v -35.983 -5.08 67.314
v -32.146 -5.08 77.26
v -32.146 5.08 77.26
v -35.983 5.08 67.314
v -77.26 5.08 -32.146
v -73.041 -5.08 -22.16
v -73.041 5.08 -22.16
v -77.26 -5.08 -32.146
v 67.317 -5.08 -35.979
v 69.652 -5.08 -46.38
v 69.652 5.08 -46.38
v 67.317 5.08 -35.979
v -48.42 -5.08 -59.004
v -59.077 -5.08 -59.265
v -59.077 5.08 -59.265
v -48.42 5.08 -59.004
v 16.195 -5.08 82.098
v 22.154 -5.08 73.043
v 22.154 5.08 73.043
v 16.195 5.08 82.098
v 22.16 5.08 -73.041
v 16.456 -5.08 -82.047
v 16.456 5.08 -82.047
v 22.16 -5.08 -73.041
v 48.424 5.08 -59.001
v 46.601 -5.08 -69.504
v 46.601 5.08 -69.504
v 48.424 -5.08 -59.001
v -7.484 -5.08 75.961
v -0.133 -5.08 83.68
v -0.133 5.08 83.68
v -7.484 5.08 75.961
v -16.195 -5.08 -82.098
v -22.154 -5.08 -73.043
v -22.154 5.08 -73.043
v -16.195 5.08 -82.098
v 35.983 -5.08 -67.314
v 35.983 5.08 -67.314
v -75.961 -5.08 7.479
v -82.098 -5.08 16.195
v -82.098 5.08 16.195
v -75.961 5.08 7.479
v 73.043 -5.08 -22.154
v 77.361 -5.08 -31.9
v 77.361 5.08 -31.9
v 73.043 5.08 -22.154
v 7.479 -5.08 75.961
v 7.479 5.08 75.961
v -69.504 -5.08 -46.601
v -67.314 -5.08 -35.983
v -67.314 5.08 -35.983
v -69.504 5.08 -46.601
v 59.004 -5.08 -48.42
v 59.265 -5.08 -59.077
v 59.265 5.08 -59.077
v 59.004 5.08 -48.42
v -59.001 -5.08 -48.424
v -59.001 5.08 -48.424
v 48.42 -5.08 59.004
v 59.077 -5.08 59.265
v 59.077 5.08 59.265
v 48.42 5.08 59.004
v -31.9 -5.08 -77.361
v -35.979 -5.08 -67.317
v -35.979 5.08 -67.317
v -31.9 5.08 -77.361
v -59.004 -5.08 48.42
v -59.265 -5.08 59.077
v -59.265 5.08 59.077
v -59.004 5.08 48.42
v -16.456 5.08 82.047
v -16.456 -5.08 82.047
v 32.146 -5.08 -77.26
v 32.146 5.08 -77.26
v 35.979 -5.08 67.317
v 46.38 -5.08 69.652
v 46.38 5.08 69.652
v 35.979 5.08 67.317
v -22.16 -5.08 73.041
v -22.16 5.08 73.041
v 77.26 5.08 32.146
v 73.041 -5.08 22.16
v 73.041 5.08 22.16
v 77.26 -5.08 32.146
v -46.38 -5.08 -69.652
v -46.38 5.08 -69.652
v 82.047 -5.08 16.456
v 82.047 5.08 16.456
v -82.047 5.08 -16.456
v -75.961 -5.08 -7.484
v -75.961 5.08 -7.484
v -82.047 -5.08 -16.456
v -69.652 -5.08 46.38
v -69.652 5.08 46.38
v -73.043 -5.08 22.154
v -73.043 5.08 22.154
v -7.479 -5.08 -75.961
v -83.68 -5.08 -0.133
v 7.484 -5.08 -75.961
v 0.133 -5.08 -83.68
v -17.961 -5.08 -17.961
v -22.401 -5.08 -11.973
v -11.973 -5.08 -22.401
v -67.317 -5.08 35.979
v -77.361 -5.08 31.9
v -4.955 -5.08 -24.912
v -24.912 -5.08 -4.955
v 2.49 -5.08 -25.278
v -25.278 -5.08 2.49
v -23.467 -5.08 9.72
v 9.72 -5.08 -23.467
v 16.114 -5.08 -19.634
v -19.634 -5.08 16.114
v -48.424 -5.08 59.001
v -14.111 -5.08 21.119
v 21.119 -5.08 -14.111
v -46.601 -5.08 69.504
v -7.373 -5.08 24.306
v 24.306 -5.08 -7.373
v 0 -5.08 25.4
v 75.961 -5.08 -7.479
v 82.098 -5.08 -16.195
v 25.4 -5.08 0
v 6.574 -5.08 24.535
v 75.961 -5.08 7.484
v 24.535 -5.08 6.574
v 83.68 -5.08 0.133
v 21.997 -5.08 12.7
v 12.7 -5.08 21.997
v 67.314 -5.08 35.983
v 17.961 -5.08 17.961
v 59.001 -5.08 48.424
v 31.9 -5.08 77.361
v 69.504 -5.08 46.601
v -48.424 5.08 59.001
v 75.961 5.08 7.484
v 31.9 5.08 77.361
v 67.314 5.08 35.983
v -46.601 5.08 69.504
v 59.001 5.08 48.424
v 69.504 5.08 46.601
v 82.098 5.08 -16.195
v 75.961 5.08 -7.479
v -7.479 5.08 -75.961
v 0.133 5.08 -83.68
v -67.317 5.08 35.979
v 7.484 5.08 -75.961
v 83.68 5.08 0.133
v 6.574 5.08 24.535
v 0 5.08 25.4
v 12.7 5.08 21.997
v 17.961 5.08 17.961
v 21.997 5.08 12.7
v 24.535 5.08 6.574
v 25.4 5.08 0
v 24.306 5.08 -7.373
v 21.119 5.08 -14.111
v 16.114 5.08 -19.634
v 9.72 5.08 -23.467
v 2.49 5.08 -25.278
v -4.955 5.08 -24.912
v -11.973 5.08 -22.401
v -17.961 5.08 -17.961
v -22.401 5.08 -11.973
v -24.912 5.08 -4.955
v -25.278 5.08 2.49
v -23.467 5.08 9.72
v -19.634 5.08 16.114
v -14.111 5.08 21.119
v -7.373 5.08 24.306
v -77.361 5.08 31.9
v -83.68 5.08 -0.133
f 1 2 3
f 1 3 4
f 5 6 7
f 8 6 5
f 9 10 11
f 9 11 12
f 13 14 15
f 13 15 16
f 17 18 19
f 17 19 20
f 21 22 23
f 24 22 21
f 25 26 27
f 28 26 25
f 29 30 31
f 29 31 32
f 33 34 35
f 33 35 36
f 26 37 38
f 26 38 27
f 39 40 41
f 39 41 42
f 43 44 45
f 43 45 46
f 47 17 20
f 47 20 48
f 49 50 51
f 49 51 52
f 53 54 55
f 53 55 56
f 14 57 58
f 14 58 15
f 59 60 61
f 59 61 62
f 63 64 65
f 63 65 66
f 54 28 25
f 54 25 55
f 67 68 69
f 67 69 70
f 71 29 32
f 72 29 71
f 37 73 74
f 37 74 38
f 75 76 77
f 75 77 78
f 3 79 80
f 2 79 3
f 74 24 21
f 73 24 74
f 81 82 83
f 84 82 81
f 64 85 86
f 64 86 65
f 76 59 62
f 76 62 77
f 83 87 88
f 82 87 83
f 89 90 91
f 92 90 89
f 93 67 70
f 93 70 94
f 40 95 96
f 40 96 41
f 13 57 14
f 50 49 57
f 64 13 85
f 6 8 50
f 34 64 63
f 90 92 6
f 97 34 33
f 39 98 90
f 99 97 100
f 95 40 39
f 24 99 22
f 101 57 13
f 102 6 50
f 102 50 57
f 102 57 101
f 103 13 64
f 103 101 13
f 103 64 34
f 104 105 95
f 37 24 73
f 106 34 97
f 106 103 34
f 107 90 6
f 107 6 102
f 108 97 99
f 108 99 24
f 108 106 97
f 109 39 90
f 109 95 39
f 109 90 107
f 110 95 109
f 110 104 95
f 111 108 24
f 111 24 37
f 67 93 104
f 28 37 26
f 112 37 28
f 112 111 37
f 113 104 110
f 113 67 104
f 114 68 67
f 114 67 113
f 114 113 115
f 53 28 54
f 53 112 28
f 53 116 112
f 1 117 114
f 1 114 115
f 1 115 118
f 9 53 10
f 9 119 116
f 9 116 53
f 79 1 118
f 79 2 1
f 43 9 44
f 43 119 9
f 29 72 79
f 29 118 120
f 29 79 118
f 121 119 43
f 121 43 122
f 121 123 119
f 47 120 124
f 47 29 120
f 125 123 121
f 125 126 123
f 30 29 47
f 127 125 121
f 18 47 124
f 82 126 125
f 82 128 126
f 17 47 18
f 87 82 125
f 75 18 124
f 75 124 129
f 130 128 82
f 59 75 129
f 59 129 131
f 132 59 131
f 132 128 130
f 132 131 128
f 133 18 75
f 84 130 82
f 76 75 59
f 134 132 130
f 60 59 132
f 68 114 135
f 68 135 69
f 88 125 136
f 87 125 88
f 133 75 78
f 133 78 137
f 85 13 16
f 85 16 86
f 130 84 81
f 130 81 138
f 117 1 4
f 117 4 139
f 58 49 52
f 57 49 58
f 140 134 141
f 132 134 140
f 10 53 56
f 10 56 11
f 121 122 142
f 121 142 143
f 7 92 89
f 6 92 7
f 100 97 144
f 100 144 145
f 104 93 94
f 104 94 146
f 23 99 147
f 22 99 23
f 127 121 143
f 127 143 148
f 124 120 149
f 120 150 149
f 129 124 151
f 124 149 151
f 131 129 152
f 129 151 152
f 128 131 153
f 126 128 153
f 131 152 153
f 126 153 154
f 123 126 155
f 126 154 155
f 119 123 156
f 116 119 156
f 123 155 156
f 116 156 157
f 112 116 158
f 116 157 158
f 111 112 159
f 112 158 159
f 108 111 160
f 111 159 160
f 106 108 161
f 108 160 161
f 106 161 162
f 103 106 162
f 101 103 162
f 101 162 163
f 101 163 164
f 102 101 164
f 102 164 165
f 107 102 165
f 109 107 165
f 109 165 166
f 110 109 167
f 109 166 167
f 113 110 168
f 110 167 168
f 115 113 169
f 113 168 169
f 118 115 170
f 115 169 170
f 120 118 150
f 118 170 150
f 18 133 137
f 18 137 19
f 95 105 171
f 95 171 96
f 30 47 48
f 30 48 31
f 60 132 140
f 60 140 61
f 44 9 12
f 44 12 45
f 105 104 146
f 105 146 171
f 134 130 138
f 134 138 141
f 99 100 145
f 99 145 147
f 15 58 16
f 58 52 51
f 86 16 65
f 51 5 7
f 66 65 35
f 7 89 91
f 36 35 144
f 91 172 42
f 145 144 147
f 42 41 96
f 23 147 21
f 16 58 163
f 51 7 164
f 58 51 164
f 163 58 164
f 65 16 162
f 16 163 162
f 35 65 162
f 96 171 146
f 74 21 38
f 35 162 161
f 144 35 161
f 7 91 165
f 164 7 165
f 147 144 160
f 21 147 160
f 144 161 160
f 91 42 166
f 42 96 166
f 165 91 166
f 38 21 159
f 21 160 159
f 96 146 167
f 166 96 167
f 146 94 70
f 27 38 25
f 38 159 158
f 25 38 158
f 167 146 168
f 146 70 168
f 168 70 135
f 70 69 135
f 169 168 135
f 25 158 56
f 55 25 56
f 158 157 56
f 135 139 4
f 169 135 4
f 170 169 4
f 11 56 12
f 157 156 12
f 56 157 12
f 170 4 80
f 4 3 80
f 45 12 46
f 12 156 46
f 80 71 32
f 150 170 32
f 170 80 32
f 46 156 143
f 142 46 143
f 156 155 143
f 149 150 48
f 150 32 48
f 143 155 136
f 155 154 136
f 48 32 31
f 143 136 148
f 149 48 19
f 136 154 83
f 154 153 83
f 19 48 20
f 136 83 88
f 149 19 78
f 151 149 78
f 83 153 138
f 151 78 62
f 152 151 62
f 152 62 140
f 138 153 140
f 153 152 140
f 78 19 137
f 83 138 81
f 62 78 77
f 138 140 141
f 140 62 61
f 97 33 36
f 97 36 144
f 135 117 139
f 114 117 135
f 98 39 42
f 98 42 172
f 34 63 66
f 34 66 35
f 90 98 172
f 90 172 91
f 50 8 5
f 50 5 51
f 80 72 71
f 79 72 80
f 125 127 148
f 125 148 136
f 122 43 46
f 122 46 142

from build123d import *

# Parameters (mm, degrees)
F1_DEPTH = 5.08
F2_DEPTH = 5.08
F3_DEPTH = 5.08


with BuildPart() as f1:
    # F0 (on Front) → F1 (new body, symmetric)
    with BuildSketch(Plane.XZ):
        with BuildLine():
            ThreePointArc((75.8478085303, 7.3177825298), (76.1119012048, 3.6631263964), (76.2, 0))
            ThreePointArc((76.2, 0), (76.1119012048, -3.6631263964), (75.8478085303, -7.3177825298))
            Line((75.8478085303, -7.3177825298), (75.9612060886, -7.4788283967))
            Line((75.9612060886, -7.4788283967), (83.6803820326, 0.1329535853))
            Line((83.6803820326, 0.1329535853), (75.9606798536, 7.4841713504))
            Line((75.9606798536, 7.4841713504), (75.8478085303, 7.3177825298))
        make_face()
        with BuildLine():
            ThreePointArc((75.8180427075, 7.62), (75.8330761724, 7.4689060931), (75.8478085303, 7.3177825298))
            Line((75.8478085303, 7.3177825298), (75.9606798536, 7.4841713504))
            Line((75.9606798536, 7.4841713504), (75.8180427075, 7.62))
        make_face()
        with BuildLine():
            Line((75.9612060886, -7.4788283967), (75.8478085303, -7.3177825298))
            ThreePointArc((75.8478085303, -7.3177825298), (75.8330761724, -7.4689060931), (75.8180427075, -7.62))
            Line((75.8180427075, -7.62), (75.9612060886, -7.4788283967))
        make_face()
        with BuildLine():
            ThreePointArc((72.9627856072, 21.9743467808), (74.7358383667, 14.8658825376), (75.8180427075, 7.62))
            Line((75.8180427075, 7.62), (75.9606798536, 7.4841713504))
            Line((75.9606798536, 7.4841713504), (82.0465489983, 16.4556315966))
            Line((82.0465489983, 16.4556315966), (73.041027291, 22.1595585897))
            Line((73.041027291, 22.1595585897), (72.9627856072, 21.9743467808))
        make_face()
        with BuildLine():
            Line((75.9612060886, -7.4788283967), (75.8180427075, -7.62))
            ThreePointArc((75.8180427075, -7.62), (74.7358383667, -14.8658825376), (72.9627856072, -21.9743467808))
            Line((72.9627856072, -21.9743467808), (73.0425857732, -22.1544209627))
            Line((73.0425857732, -22.1544209627), (82.0984249139, -16.1948337577))
            Line((82.0984249139, -16.1948337577), (75.9612060886, -7.4788283967))
        make_face()
        with BuildLine():
            ThreePointArc((72.8746320228, 22.2649502031), (72.9188535828, 22.1196924068), (72.9627856072, 21.9743467808))
            Line((72.9627856072, 21.9743467808), (73.041027291, 22.1595585897))
            Line((73.041027291, 22.1595585897), (72.8746320228, 22.2649502031))
        make_face()
        with BuildLine():
            Line((73.0425857732, -22.1544209627), (72.9627856072, -21.9743467808))
            ThreePointArc((72.9627856072, -21.9743467808), (72.9188535828, -22.1196924068), (72.8746320228, -22.2649502031))
            Line((72.8746320228, -22.2649502031), (73.0425857732, -22.1544209627))
        make_face()
        with BuildLine():
            ThreePointArc((67.2738437512, 35.7864492084), (70.3996203774, 29.1604775462), (72.8746320228, 22.2649502031))
            Line((72.8746320228, 22.2649502031), (73.041027291, 22.1595585897))
            Line((73.041027291, 22.1595585897), (77.2597130983, 32.1459289141))
            Line((77.2597130983, 32.1459289141), (67.3144490116, 35.9833664196))
            Line((67.3144490116, 35.9833664196), (67.2738437512, 35.7864492084))
        make_face()
        with BuildLine():
            Line((73.0425857732, -22.1544209627), (72.8746320228, -22.2649502031))
            ThreePointArc((72.8746320228, -22.2649502031), (70.3996203774, -29.1604775462), (67.2738437512, -35.7864492084))
            Line((67.2738437512, -35.7864492084), (67.3169798492, -35.9786315554))
            Line((67.3169798492, -35.9786315554), (77.361471367, -31.9002627216))
            Line((77.361471367, -31.9002627216), (73.0425857732, -22.1544209627))
        make_face()
        with BuildLine():
            ThreePointArc((67.1306900979, 36.0542708563), (67.2024003433, 35.9204313461), (67.2738437512, 35.7864492084))
            Line((67.2738437512, 35.7864492084), (67.3144490116, 35.9833664196))
            Line((67.3144490116, 35.9833664196), (67.1306900979, 36.0542708563))
        make_face()
        with BuildLine():
            Line((67.3169798492, -35.9786315554), (67.2738437512, -35.7864492084))
            ThreePointArc((67.2738437512, -35.7864492084), (67.2024003433, -35.9204313461), (67.1306900979, -36.0542708563))
            Line((67.1306900979, -36.0542708563), (67.3169798492, -35.9786315554))
        make_face()
        with BuildLine():
            ThreePointArc((58.9996058074, 48.2232984621), (63.3579844575, 42.3344517561), (67.1306900979, 36.0542708563))
            Line((67.1306900979, 36.0542708563), (67.3144490116, 35.9833664196))
            Line((67.3144490116, 35.9833664196), (69.5038297516, 46.6008762111))
            Line((69.5038297516, 46.6008762111), (59.001014207, 48.4243536577))
            Line((59.001014207, 48.4243536577), (58.9996058074, 48.2232984621))
        make_face()
        with BuildLine():
            Line((67.3169798492, -35.9786315554), (67.1306900979, -36.0542708563))
            ThreePointArc((67.1306900979, -36.0542708563), (63.3579844575, -42.3344517561), (58.9996058074, -48.2232984621))
            Line((58.9996058074, -48.2232984621), (59.0044201415, -48.4202035145))
            Line((59.0044201415, -48.4202035145), (69.6515598604, -46.379782479))
            Line((69.6515598604, -46.379782479), (67.3169798492, -35.9786315554))
        make_face()
        with BuildLine():
            ThreePointArc((58.8069534, 48.4580460999), (58.9033965462, 48.3407682533), (58.9996058074, 48.2232984621))
            Line((58.9996058074, 48.2232984621), (59.001014207, 48.4243536577))
            Line((59.001014207, 48.4243536577), (58.8069534, 48.4580460999))
        make_face()
        with BuildLine():
            Line((59.0044201415, -48.4202035145), (58.9996058074, -48.2232984621))
            ThreePointArc((58.9996058074, -48.2232984621), (58.9033965462, -48.3407682533), (58.8069534, -48.4580460999))
            Line((58.8069534, -48.4580460999), (59.0044201415, -48.4202035145))
        make_face()
        with BuildLine():
            ThreePointArc((48.4580460999, 58.8069534), (53.8815367264, 53.8815367264), (58.8069534, 48.4580460999))
            Line((58.8069534, 48.4580460999), (59.001014207, 48.4243536577))
            Line((59.001014207, 48.4243536577), (59.0769532058, 59.2649779693))
            Line((59.0769532058, 59.2649779693), (48.4202035145, 59.0044201415))
            Line((48.4202035145, 59.0044201415), (48.4580460999, 58.8069534))
        make_face()
        with BuildLine():
            Line((59.0044201415, -48.4202035145), (58.8069534, -48.4580460999))
            ThreePointArc((58.8069534, -48.4580460999), (53.8815367264, -53.8815367264), (48.4580460999, -58.8069534))
            Line((48.4580460999, -58.8069534), (48.4243536577, -59.001014207))
            Line((48.4243536577, -59.001014207), (59.2649779693, -59.0769532058))
            Line((59.2649779693, -59.0769532058), (59.0044201415, -48.4202035145))
        make_face()
        with BuildLine():
            ThreePointArc((48.2232984621, 58.9996058074), (48.3407682533, 58.9033965462), (48.4580460999, 58.8069534))
            Line((48.4580460999, 58.8069534), (48.4202035145, 59.0044201415))
            Line((48.4202035145, 59.0044201415), (48.2232984621, 58.9996058074))
        make_face()
        with BuildLine():
            Line((48.4243536577, -59.001014207), (48.4580460999, -58.8069534))
            ThreePointArc((48.4580460999, -58.8069534), (48.3407682533, -58.9033965462), (48.2232984621, -58.9996058074))
            Line((48.2232984621, -58.9996058074), (48.4243536577, -59.001014207))
        make_face()
        with BuildLine():
            ThreePointArc((36.0542708563, 67.1306900979), (42.3344517561, 63.3579844575), (48.2232984621, 58.9996058074))
            Line((48.2232984621, 58.9996058074), (48.4202035145, 59.0044201415))
            Line((48.4202035145, 59.0044201415), (46.379782479, 69.6515598604))
            Line((46.379782479, 69.6515598604), (35.9786315554, 67.3169798492))
            Line((35.9786315554, 67.3169798492), (36.0542708563, 67.1306900979))
        make_face()
        with BuildLine():
            Line((48.4243536577, -59.001014207), (48.2232984621, -58.9996058074))
            ThreePointArc((48.2232984621, -58.9996058074), (42.3344517561, -63.3579844575), (36.0542708563, -67.1306900979))
            Line((36.0542708563, -67.1306900979), (35.9833664196, -67.3144490116))
            Line((35.9833664196, -67.3144490116), (46.6008762111, -69.5038297516))
            Line((46.6008762111, -69.5038297516), (48.4243536577, -59.001014207))
        make_face()
        with BuildLine():
            ThreePointArc((35.7864492084, 67.2738437512), (35.9204313461, 67.2024003433), (36.0542708563, 67.1306900979))
            Line((36.0542708563, 67.1306900979), (35.9786315554, 67.3169798492))
            Line((35.9786315554, 67.3169798492), (35.7864492084, 67.2738437512))
        make_face()
        with BuildLine():
            Line((35.9833664196, -67.3144490116), (36.0542708563, -67.1306900979))
            ThreePointArc((36.0542708563, -67.1306900979), (35.9204313461, -67.2024003433), (35.7864492084, -67.2738437512))
            Line((35.7864492084, -67.2738437512), (35.9833664196, -67.3144490116))
        make_face()
        with BuildLine():
            ThreePointArc((22.2649502031, 72.8746320228), (29.1604775462, 70.3996203774), (35.7864492084, 67.2738437512))
            Line((35.7864492084, 67.2738437512), (35.9786315554, 67.3169798492))
            Line((35.9786315554, 67.3169798492), (31.9002627216, 77.361471367))
            Line((31.9002627216, 77.361471367), (22.1544209627, 73.0425857732))
            Line((22.1544209627, 73.0425857732), (22.2649502031, 72.8746320228))
        make_face()
        with BuildLine():
            Line((35.9833664196, -67.3144490116), (35.7864492084, -67.2738437512))
            ThreePointArc((35.7864492084, -67.2738437512), (29.1604775462, -70.3996203774), (22.2649502031, -72.8746320228))
            Line((22.2649502031, -72.8746320228), (22.1595585897, -73.041027291))
            Line((22.1595585897, -73.041027291), (32.1459289141, -77.2597130983))
            Line((32.1459289141, -77.2597130983), (35.9833664196, -67.3144490116))
        make_face()
        with BuildLine():
            ThreePointArc((21.9743467808, 72.9627856072), (22.1196924068, 72.9188535828), (22.2649502031, 72.8746320228))
            Line((22.2649502031, 72.8746320228), (22.1544209627, 73.0425857732))
            Line((22.1544209627, 73.0425857732), (21.9743467808, 72.9627856072))
        make_face()
        with BuildLine():
            Line((22.1595585897, -73.041027291), (22.2649502031, -72.8746320228))
            ThreePointArc((22.2649502031, -72.8746320228), (22.1196924068, -72.9188535828), (21.9743467808, -72.9627856072))
            Line((21.9743467808, -72.9627856072), (22.1595585897, -73.041027291))
        make_face()
        with BuildLine():
            ThreePointArc((7.62, 75.8180427075), (14.8658825376, 74.7358383667), (21.9743467808, 72.9627856072))
            Line((21.9743467808, 72.9627856072), (22.1544209627, 73.0425857732))
            Line((22.1544209627, 73.0425857732), (16.1948337577, 82.0984249139))
            Line((16.1948337577, 82.0984249139), (7.4788283967, 75.9612060886))
            Line((7.4788283967, 75.9612060886), (7.62, 75.8180427075))
        make_face()
        with BuildLine():
            Line((22.1595585897, -73.041027291), (21.9743467808, -72.9627856072))
            ThreePointArc((21.9743467808, -72.9627856072), (14.8658825376, -74.7358383667), (7.62, -75.8180427075))
            Line((7.62, -75.8180427075), (7.4841713504, -75.9606798536))
            Line((7.4841713504, -75.9606798536), (16.4556315966, -82.0465489983))
            Line((16.4556315966, -82.0465489983), (22.1595585897, -73.041027291))
        make_face()
        with BuildLine():
            ThreePointArc((7.3177825298, 75.8478085303), (7.4689060931, 75.8330761724), (7.62, 75.8180427075))
            Line((7.62, 75.8180427075), (7.4788283967, 75.9612060886))
            Line((7.4788283967, 75.9612060886), (7.3177825298, 75.8478085303))
        make_face()
        with BuildLine():
            Line((7.4841713504, -75.9606798536), (7.62, -75.8180427075))
            ThreePointArc((7.62, -75.8180427075), (7.4689060931, -75.8330761724), (7.3177825298, -75.8478085303))
            Line((7.3177825298, -75.8478085303), (7.4841713504, -75.9606798536))
        make_face()
        with BuildLine():
            ThreePointArc((0, 76.2), (3.6631263964, 76.1119012048), (7.3177825298, 75.8478085303))
            Line((7.3177825298, 75.8478085303), (7.4788283967, 75.9612060886))
            Line((7.4788283967, 75.9612060886), (-0.1329535853, 83.6803820326))
            Line((-0.1329535853, 83.6803820326), (-7.4841713504, 75.9606798536))
            Line((-7.4841713504, 75.9606798536), (-7.3177825298, 75.8478085303))
            ThreePointArc((-7.3177825298, 75.8478085303), (-3.6631263964, 76.1119012048), (0, 76.2))
        make_face()
        with BuildLine():
            Line((7.4841713504, -75.9606798536), (7.3177825298, -75.8478085303))
            ThreePointArc((7.3177825298, -75.8478085303), (0, -76.2), (-7.3177825298, -75.8478085303))
            Line((-7.3177825298, -75.8478085303), (-7.4788283967, -75.9612060886))
            Line((-7.4788283967, -75.9612060886), (0.1329535853, -83.6803820326))
            Line((0.1329535853, -83.6803820326), (7.4841713504, -75.9606798536))
        make_face()
        with BuildLine():
            Line((-7.4788283967, -75.9612060886), (-7.3177825298, -75.8478085303))
            ThreePointArc((-7.3177825298, -75.8478085303), (-7.4689060931, -75.8330761724), (-7.62, -75.8180427075))
            Line((-7.62, -75.8180427075), (-7.4788283967, -75.9612060886))
        make_face()
        with BuildLine():
            ThreePointArc((-7.62, 75.8180427075), (-7.4689060931, 75.8330761724), (-7.3177825298, 75.8478085303))
            Line((-7.3177825298, 75.8478085303), (-7.4841713504, 75.9606798536))
            Line((-7.4841713504, 75.9606798536), (-7.62, 75.8180427075))
        make_face()
        with BuildLine():
            Line((-7.62, 75.8180427075), (-7.4841713504, 75.9606798536))
            Line((-7.4841713504, 75.9606798536), (-16.4556315966, 82.0465489983))
            Line((-16.4556315966, 82.0465489983), (-22.1595585897, 73.041027291))
            Line((-22.1595585897, 73.041027291), (-21.9743467808, 72.9627856072))
            ThreePointArc((-21.9743467808, 72.9627856072), (-14.8658825376, 74.7358383667), (-7.62, 75.8180427075))
        make_face()
        with BuildLine():
            Line((-7.4788283967, -75.9612060886), (-7.62, -75.8180427075))
            ThreePointArc((-7.62, -75.8180427075), (-14.8658825376, -74.7358383667), (-21.9743467808, -72.9627856072))
            Line((-21.9743467808, -72.9627856072), (-22.1544209627, -73.0425857732))
            Line((-22.1544209627, -73.0425857732), (-16.1948337577, -82.0984249139))
            Line((-16.1948337577, -82.0984249139), (-7.4788283967, -75.9612060886))
        make_face()
        with BuildLine():
            Line((-22.1544209627, -73.0425857732), (-21.9743467808, -72.9627856072))
            ThreePointArc((-21.9743467808, -72.9627856072), (-22.1196924068, -72.9188535828), (-22.2649502031, -72.8746320228))
            Line((-22.2649502031, -72.8746320228), (-22.1544209627, -73.0425857732))
        make_face()
        with BuildLine():
            ThreePointArc((-22.2649502031, 72.8746320228), (-22.1196924068, 72.9188535828), (-21.9743467808, 72.9627856072))
            Line((-21.9743467808, 72.9627856072), (-22.1595585897, 73.041027291))
            Line((-22.1595585897, 73.041027291), (-22.2649502031, 72.8746320228))
        make_face()
        with BuildLine():
            Line((-22.2649502031, 72.8746320228), (-22.1595585897, 73.041027291))
            Line((-22.1595585897, 73.041027291), (-32.1459289141, 77.2597130983))
            Line((-32.1459289141, 77.2597130983), (-35.9833664196, 67.3144490116))
            Line((-35.9833664196, 67.3144490116), (-35.7864492084, 67.2738437512))
            ThreePointArc((-35.7864492084, 67.2738437512), (-29.1604775462, 70.3996203774), (-22.2649502031, 72.8746320228))
        make_face()
        with BuildLine():
            Line((-22.1544209627, -73.0425857732), (-22.2649502031, -72.8746320228))
            ThreePointArc((-22.2649502031, -72.8746320228), (-29.1604775462, -70.3996203774), (-35.7864492084, -67.2738437512))
            Line((-35.7864492084, -67.2738437512), (-35.9786315554, -67.3169798492))
            Line((-35.9786315554, -67.3169798492), (-31.9002627216, -77.361471367))
            Line((-31.9002627216, -77.361471367), (-22.1544209627, -73.0425857732))
        make_face()
        with BuildLine():
            Line((-35.9786315554, -67.3169798492), (-35.7864492084, -67.2738437512))
            ThreePointArc((-35.7864492084, -67.2738437512), (-35.9204313461, -67.2024003433), (-36.0542708563, -67.1306900979))
            Line((-36.0542708563, -67.1306900979), (-35.9786315554, -67.3169798492))
        make_face()
        with BuildLine():
            ThreePointArc((-36.0542708563, 67.1306900979), (-35.9204313461, 67.2024003433), (-35.7864492084, 67.2738437512))
            Line((-35.7864492084, 67.2738437512), (-35.9833664196, 67.3144490116))
            Line((-35.9833664196, 67.3144490116), (-36.0542708563, 67.1306900979))
        make_face()
        with BuildLine():
            Line((-36.0542708563, 67.1306900979), (-35.9833664196, 67.3144490116))
            Line((-35.9833664196, 67.3144490116), (-46.6008762111, 69.5038297516))
            Line((-46.6008762111, 69.5038297516), (-48.4243536577, 59.001014207))
            Line((-48.4243536577, 59.001014207), (-48.2232984621, 58.9996058074))
            ThreePointArc((-48.2232984621, 58.9996058074), (-42.3344517561, 63.3579844575), (-36.0542708563, 67.1306900979))
        make_face()
        with BuildLine():
            Line((-35.9786315554, -67.3169798492), (-36.0542708563, -67.1306900979))
            ThreePointArc((-36.0542708563, -67.1306900979), (-42.3344517561, -63.3579844575), (-48.2232984621, -58.9996058074))
            Line((-48.2232984621, -58.9996058074), (-48.4202035145, -59.0044201415))
            Line((-48.4202035145, -59.0044201415), (-46.379782479, -69.6515598604))
            Line((-46.379782479, -69.6515598604), (-35.9786315554, -67.3169798492))
        make_face()
        with BuildLine():
            Line((-48.4202035145, -59.0044201415), (-48.2232984621, -58.9996058074))
            ThreePointArc((-48.2232984621, -58.9996058074), (-48.3407682533, -58.9033965462), (-48.4580460999, -58.8069534))
            Line((-48.4580460999, -58.8069534), (-48.4202035145, -59.0044201415))
        make_face()
        with BuildLine():
            ThreePointArc((-48.4580460999, 58.8069534), (-48.3407682533, 58.9033965462), (-48.2232984621, 58.9996058074))
            Line((-48.2232984621, 58.9996058074), (-48.4243536577, 59.001014207))
            Line((-48.4243536577, 59.001014207), (-48.4580460999, 58.8069534))
        make_face()
        with BuildLine():
            Line((-48.4580460999, 58.8069534), (-48.4243536577, 59.001014207))
            Line((-48.4243536577, 59.001014207), (-59.2649779693, 59.0769532058))
            Line((-59.2649779693, 59.0769532058), (-59.0044201415, 48.4202035145))
            Line((-59.0044201415, 48.4202035145), (-58.8069534, 48.4580460999))
            ThreePointArc((-58.8069534, 48.4580460999), (-53.8815367264, 53.8815367264), (-48.4580460999, 58.8069534))
        make_face()
        with BuildLine():
            Line((-48.4202035145, -59.0044201415), (-48.4580460999, -58.8069534))
            ThreePointArc((-48.4580460999, -58.8069534), (-53.8815367264, -53.8815367264), (-58.8069534, -48.4580460999))
            Line((-58.8069534, -48.4580460999), (-59.001014207, -48.4243536577))
            Line((-59.001014207, -48.4243536577), (-59.0769532058, -59.2649779693))
            Line((-59.0769532058, -59.2649779693), (-48.4202035145, -59.0044201415))
        make_face()
        with BuildLine():
            Line((-59.001014207, -48.4243536577), (-58.8069534, -48.4580460999))
            ThreePointArc((-58.8069534, -48.4580460999), (-58.9033965462, -48.3407682533), (-58.9996058074, -48.2232984621))
            Line((-58.9996058074, -48.2232984621), (-59.001014207, -48.4243536577))
        make_face()
        with BuildLine():
            ThreePointArc((-58.9996058074, 48.2232984621), (-58.9033965462, 48.3407682533), (-58.8069534, 48.4580460999))
            Line((-58.8069534, 48.4580460999), (-59.0044201415, 48.4202035145))
            Line((-59.0044201415, 48.4202035145), (-58.9996058074, 48.2232984621))
        make_face()
        with BuildLine():
            Line((-58.9996058074, 48.2232984621), (-59.0044201415, 48.4202035145))
            Line((-59.0044201415, 48.4202035145), (-69.6515598604, 46.379782479))
            Line((-69.6515598604, 46.379782479), (-67.3169798492, 35.9786315554))
            Line((-67.3169798492, 35.9786315554), (-67.1306900979, 36.0542708563))
            ThreePointArc((-67.1306900979, 36.0542708563), (-63.3579844575, 42.3344517561), (-58.9996058074, 48.2232984621))
        make_face()
        with BuildLine():
            Line((-59.001014207, -48.4243536577), (-58.9996058074, -48.2232984621))
            ThreePointArc((-58.9996058074, -48.2232984621), (-63.3579844575, -42.3344517561), (-67.1306900979, -36.0542708563))
            Line((-67.1306900979, -36.0542708563), (-67.3144490116, -35.9833664196))
            Line((-67.3144490116, -35.9833664196), (-69.5038297516, -46.6008762111))
            Line((-69.5038297516, -46.6008762111), (-59.001014207, -48.4243536577))
        make_face()
        with BuildLine():
            Line((-67.3144490116, -35.9833664196), (-67.1306900979, -36.0542708563))
            ThreePointArc((-67.1306900979, -36.0542708563), (-67.2024003433, -35.9204313461), (-67.2738437512, -35.7864492084))
            Line((-67.2738437512, -35.7864492084), (-67.3144490116, -35.9833664196))
        make_face()
        with BuildLine():
            ThreePointArc((-67.2738437512, 35.7864492084), (-67.2024003433, 35.9204313461), (-67.1306900979, 36.0542708563))
            Line((-67.1306900979, 36.0542708563), (-67.3169798492, 35.9786315554))
            Line((-67.3169798492, 35.9786315554), (-67.2738437512, 35.7864492084))
        make_face()
        with BuildLine():
            Line((-67.2738437512, 35.7864492084), (-67.3169798492, 35.9786315554))
            Line((-67.3169798492, 35.9786315554), (-77.361471367, 31.9002627216))
            Line((-77.361471367, 31.9002627216), (-73.0425857732, 22.1544209627))
            Line((-73.0425857732, 22.1544209627), (-72.8746320228, 22.2649502031))
            ThreePointArc((-72.8746320228, 22.2649502031), (-70.3996203774, 29.1604775462), (-67.2738437512, 35.7864492084))
        make_face()
        with BuildLine():
            Line((-67.3144490116, -35.9833664196), (-67.2738437512, -35.7864492084))
            ThreePointArc((-67.2738437512, -35.7864492084), (-70.3996203774, -29.1604775462), (-72.8746320228, -22.2649502031))
            Line((-72.8746320228, -22.2649502031), (-73.041027291, -22.1595585897))
            Line((-73.041027291, -22.1595585897), (-77.2597130983, -32.1459289141))
            Line((-77.2597130983, -32.1459289141), (-67.3144490116, -35.9833664196))
        make_face()
        with BuildLine():
            Line((-73.041027291, -22.1595585897), (-72.8746320228, -22.2649502031))
            ThreePointArc((-72.8746320228, -22.2649502031), (-72.9188535828, -22.1196924068), (-72.9627856072, -21.9743467808))
            Line((-72.9627856072, -21.9743467808), (-73.041027291, -22.1595585897))
        make_face()
        with BuildLine():
            ThreePointArc((-72.9627856072, 21.9743467808), (-72.9188535828, 22.1196924068), (-72.8746320228, 22.2649502031))
            Line((-72.8746320228, 22.2649502031), (-73.0425857732, 22.1544209627))
            Line((-73.0425857732, 22.1544209627), (-72.9627856072, 21.9743467808))
        make_face()
        with BuildLine():
            Line((-72.9627856072, 21.9743467808), (-73.0425857732, 22.1544209627))
            Line((-73.0425857732, 22.1544209627), (-82.0984249139, 16.1948337577))
            Line((-82.0984249139, 16.1948337577), (-75.9612060886, 7.4788283967))
            Line((-75.9612060886, 7.4788283967), (-75.8180427075, 7.62))
            ThreePointArc((-75.8180427075, 7.62), (-74.7358383667, 14.8658825376), (-72.9627856072, 21.9743467808))
        make_face()
        with BuildLine():
            Line((-73.041027291, -22.1595585897), (-72.9627856072, -21.9743467808))
            ThreePointArc((-72.9627856072, -21.9743467808), (-74.7358383667, -14.8658825376), (-75.8180427075, -7.62))
            Line((-75.8180427075, -7.62), (-75.9606798536, -7.4841713504))
            Line((-75.9606798536, -7.4841713504), (-82.0465489983, -16.4556315966))
            Line((-82.0465489983, -16.4556315966), (-73.041027291, -22.1595585897))
        make_face()
        with BuildLine():
            Line((-75.9606798536, -7.4841713504), (-75.8180427075, -7.62))
            ThreePointArc((-75.8180427075, -7.62), (-75.8330761724, -7.4689060931), (-75.8478085303, -7.3177825298))
            Line((-75.8478085303, -7.3177825298), (-75.9606798536, -7.4841713504))
        make_face()
        with BuildLine():
            ThreePointArc((-75.8478085303, 7.3177825298), (-75.8330761724, 7.4689060931), (-75.8180427075, 7.62))
            Line((-75.8180427075, 7.62), (-75.9612060886, 7.4788283967))
            Line((-75.9612060886, 7.4788283967), (-75.8478085303, 7.3177825298))
        make_face()
        with BuildLine():
            Line((-75.8478085303, 7.3177825298), (-75.9612060886, 7.4788283967))
            Line((-75.9612060886, 7.4788283967), (-83.6803820326, -0.1329535853))
            Line((-83.6803820326, -0.1329535853), (-75.9606798536, -7.4841713504))
            Line((-75.9606798536, -7.4841713504), (-75.8478085303, -7.3177825298))
            ThreePointArc((-75.8478085303, -7.3177825298), (-76.2, 0), (-75.8478085303, 7.3177825298))
        make_face()
    extrude(amount=F1_DEPTH, both=True)

    # F0 (on Front) → F2 (join, symmetric)
    with BuildSketch(Plane.XZ):
        with BuildLine():
            ThreePointArc((75.8478085303, -7.3177825298), (76.1119012048, -3.6631263964), (76.2, 0))
            ThreePointArc((76.2, 0), (76.1119012048, 3.6631263964), (75.8478085303, 7.3177825298))
            ThreePointArc((75.8478085303, 7.3177825298), (75.8330761724, 7.4689060931), (75.8180427075, 7.62))
            ThreePointArc((75.8180427075, 7.62), (74.7358383667, 14.8658825376), (72.9627856072, 21.9743467808))
            ThreePointArc((72.9627856072, 21.9743467808), (72.9188535828, 22.1196924068), (72.8746320228, 22.2649502031))
            ThreePointArc((72.8746320228, 22.2649502031), (70.3996203774, 29.1604775462), (67.2738437512, 35.7864492084))
            ThreePointArc((67.2738437512, 35.7864492084), (67.2024003433, 35.9204313461), (67.1306900979, 36.0542708563))
            ThreePointArc((67.1306900979, 36.0542708563), (63.3579844575, 42.3344517561), (58.9996058074, 48.2232984621))
            ThreePointArc((58.9996058074, 48.2232984621), (58.9033965462, 48.3407682533), (58.8069534, 48.4580460999))
            ThreePointArc((58.8069534, 48.4580460999), (53.8815367264, 53.8815367264), (48.4580460999, 58.8069534))
            ThreePointArc((48.4580460999, 58.8069534), (48.3407682533, 58.9033965462), (48.2232984621, 58.9996058074))
            ThreePointArc((48.2232984621, 58.9996058074), (42.3344517561, 63.3579844575), (36.0542708563, 67.1306900979))
            ThreePointArc((36.0542708563, 67.1306900979), (35.9204313461, 67.2024003433), (35.7864492084, 67.2738437512))
            ThreePointArc((35.7864492084, 67.2738437512), (29.1604775462, 70.3996203774), (22.2649502031, 72.8746320228))
            ThreePointArc((22.2649502031, 72.8746320228), (22.1196924068, 72.9188535828), (21.9743467808, 72.9627856072))
            ThreePointArc((21.9743467808, 72.9627856072), (14.8658825376, 74.7358383667), (7.62, 75.8180427075))
            ThreePointArc((7.62, 75.8180427075), (7.4689060931, 75.8330761724), (7.3177825298, 75.8478085303))
            ThreePointArc((7.3177825298, 75.8478085303), (3.6631263964, 76.1119012048), (0, 76.2))
            ThreePointArc((0, 76.2), (-3.6631263964, 76.1119012048), (-7.3177825298, 75.8478085303))
            ThreePointArc((-7.3177825298, 75.8478085303), (-7.4689060931, 75.8330761724), (-7.62, 75.8180427075))
            ThreePointArc((-7.62, 75.8180427075), (-14.8658825376, 74.7358383667), (-21.9743467808, 72.9627856072))
            ThreePointArc((-21.9743467808, 72.9627856072), (-22.1196924068, 72.9188535828), (-22.2649502031, 72.8746320228))
            ThreePointArc((-22.2649502031, 72.8746320228), (-29.1604775462, 70.3996203774), (-35.7864492084, 67.2738437512))
            ThreePointArc((-35.7864492084, 67.2738437512), (-35.9204313461, 67.2024003433), (-36.0542708563, 67.1306900979))
            ThreePointArc((-36.0542708563, 67.1306900979), (-42.3344517561, 63.3579844575), (-48.2232984621, 58.9996058074))
            ThreePointArc((-48.2232984621, 58.9996058074), (-48.3407682533, 58.9033965462), (-48.4580460999, 58.8069534))
            ThreePointArc((-48.4580460999, 58.8069534), (-53.8815367264, 53.8815367264), (-58.8069534, 48.4580460999))
            ThreePointArc((-58.8069534, 48.4580460999), (-58.9033965462, 48.3407682533), (-58.9996058074, 48.2232984621))
            ThreePointArc((-58.9996058074, 48.2232984621), (-63.3579844575, 42.3344517561), (-67.1306900979, 36.0542708563))
            ThreePointArc((-67.1306900979, 36.0542708563), (-67.2024003433, 35.9204313461), (-67.2738437512, 35.7864492084))
            ThreePointArc((-67.2738437512, 35.7864492084), (-70.3996203774, 29.1604775462), (-72.8746320228, 22.2649502031))
            ThreePointArc((-72.8746320228, 22.2649502031), (-72.9188535828, 22.1196924068), (-72.9627856072, 21.9743467808))
            ThreePointArc((-72.9627856072, 21.9743467808), (-74.7358383667, 14.8658825376), (-75.8180427075, 7.62))
            ThreePointArc((-75.8180427075, 7.62), (-75.8330761724, 7.4689060931), (-75.8478085303, 7.3177825298))
            ThreePointArc((-75.8478085303, 7.3177825298), (-76.2, 0), (-75.8478085303, -7.3177825298))
            ThreePointArc((-75.8478085303, -7.3177825298), (-75.8330761724, -7.4689060931), (-75.8180427075, -7.62))
            ThreePointArc((-75.8180427075, -7.62), (-74.7358383667, -14.8658825376), (-72.9627856072, -21.9743467808))
            ThreePointArc((-72.9627856072, -21.9743467808), (-72.9188535828, -22.1196924068), (-72.8746320228, -22.2649502031))
            ThreePointArc((-72.8746320228, -22.2649502031), (-70.3996203774, -29.1604775462), (-67.2738437512, -35.7864492084))
            ThreePointArc((-67.2738437512, -35.7864492084), (-67.2024003433, -35.9204313461), (-67.1306900979, -36.0542708563))
            ThreePointArc((-67.1306900979, -36.0542708563), (-63.3579844575, -42.3344517561), (-58.9996058074, -48.2232984621))
            ThreePointArc((-58.9996058074, -48.2232984621), (-58.9033965462, -48.3407682533), (-58.8069534, -48.4580460999))
            ThreePointArc((-58.8069534, -48.4580460999), (-53.8815367264, -53.8815367264), (-48.4580460999, -58.8069534))
            ThreePointArc((-48.4580460999, -58.8069534), (-48.3407682533, -58.9033965462), (-48.2232984621, -58.9996058074))
            ThreePointArc((-48.2232984621, -58.9996058074), (-42.3344517561, -63.3579844575), (-36.0542708563, -67.1306900979))
            ThreePointArc((-36.0542708563, -67.1306900979), (-35.9204313461, -67.2024003433), (-35.7864492084, -67.2738437512))
            ThreePointArc((-35.7864492084, -67.2738437512), (-29.1604775462, -70.3996203774), (-22.2649502031, -72.8746320228))
            ThreePointArc((-22.2649502031, -72.8746320228), (-22.1196924068, -72.9188535828), (-21.9743467808, -72.9627856072))
            ThreePointArc((-21.9743467808, -72.9627856072), (-14.8658825376, -74.7358383667), (-7.62, -75.8180427075))
            ThreePointArc((-7.62, -75.8180427075), (-7.4689060931, -75.8330761724), (-7.3177825298, -75.8478085303))
            ThreePointArc((-7.3177825298, -75.8478085303), (0, -76.2), (7.3177825298, -75.8478085303))
            ThreePointArc((7.3177825298, -75.8478085303), (7.4689060931, -75.8330761724), (7.62, -75.8180427075))
            ThreePointArc((7.62, -75.8180427075), (14.8658825376, -74.7358383667), (21.9743467808, -72.9627856072))
            ThreePointArc((21.9743467808, -72.9627856072), (22.1196924068, -72.9188535828), (22.2649502031, -72.8746320228))
            ThreePointArc((22.2649502031, -72.8746320228), (29.1604775462, -70.3996203774), (35.7864492084, -67.2738437512))
            ThreePointArc((35.7864492084, -67.2738437512), (35.9204313461, -67.2024003433), (36.0542708563, -67.1306900979))
            ThreePointArc((36.0542708563, -67.1306900979), (42.3344517561, -63.3579844575), (48.2232984621, -58.9996058074))
            ThreePointArc((48.2232984621, -58.9996058074), (48.3407682533, -58.9033965462), (48.4580460999, -58.8069534))
            ThreePointArc((48.4580460999, -58.8069534), (53.8815367264, -53.8815367264), (58.8069534, -48.4580460999))
            ThreePointArc((58.8069534, -48.4580460999), (58.9033965462, -48.3407682533), (58.9996058074, -48.2232984621))
            ThreePointArc((58.9996058074, -48.2232984621), (63.3579844575, -42.3344517561), (67.1306900979, -36.0542708563))
            ThreePointArc((67.1306900979, -36.0542708563), (67.2024003433, -35.9204313461), (67.2738437512, -35.7864492084))
            ThreePointArc((67.2738437512, -35.7864492084), (70.3996203774, -29.1604775462), (72.8746320228, -22.2649502031))
            ThreePointArc((72.8746320228, -22.2649502031), (72.9188535828, -22.1196924068), (72.9627856072, -21.9743467808))
            ThreePointArc((72.9627856072, -21.9743467808), (74.7358383667, -14.8658825376), (75.8180427075, -7.62))
            ThreePointArc((75.8180427075, -7.62), (75.8330761724, -7.4689060931), (75.8478085303, -7.3177825298))
        make_face()
        with BuildLine():
            ThreePointArc((25.4, 0), (-17.9605122421, -17.9605122421), (0, 25.4))
            ThreePointArc((0, 25.4), (17.9605122421, 17.9605122421), (25.4, 0))
        make_face(mode=Mode.SUBTRACT)
    extrude(amount=F2_DEPTH, both=True)

    # F0 (on Front) → F3 (join, symmetric)
    with BuildSketch(Plane.XZ):
        with BuildLine():
            ThreePointArc((75.8478085303, -7.3177825298), (76.1119012048, -3.6631263964), (76.2, 0))
            ThreePointArc((76.2, 0), (76.1119012048, 3.6631263964), (75.8478085303, 7.3177825298))
            ThreePointArc((75.8478085303, 7.3177825298), (75.8330761724, 7.4689060931), (75.8180427075, 7.62))
            ThreePointArc((75.8180427075, 7.62), (74.7358383667, 14.8658825376), (72.9627856072, 21.9743467808))
            ThreePointArc((72.9627856072, 21.9743467808), (72.9188535828, 22.1196924068), (72.8746320228, 22.2649502031))
            ThreePointArc((72.8746320228, 22.2649502031), (70.3996203774, 29.1604775462), (67.2738437512, 35.7864492084))
            ThreePointArc((67.2738437512, 35.7864492084), (67.2024003433, 35.9204313461), (67.1306900979, 36.0542708563))
            ThreePointArc((67.1306900979, 36.0542708563), (63.3579844575, 42.3344517561), (58.9996058074, 48.2232984621))
            ThreePointArc((58.9996058074, 48.2232984621), (58.9033965462, 48.3407682533), (58.8069534, 48.4580460999))
            ThreePointArc((58.8069534, 48.4580460999), (53.8815367264, 53.8815367264), (48.4580460999, 58.8069534))
            ThreePointArc((48.4580460999, 58.8069534), (48.3407682533, 58.9033965462), (48.2232984621, 58.9996058074))
            ThreePointArc((48.2232984621, 58.9996058074), (42.3344517561, 63.3579844575), (36.0542708563, 67.1306900979))
            ThreePointArc((36.0542708563, 67.1306900979), (35.9204313461, 67.2024003433), (35.7864492084, 67.2738437512))
            ThreePointArc((35.7864492084, 67.2738437512), (29.1604775462, 70.3996203774), (22.2649502031, 72.8746320228))
            ThreePointArc((22.2649502031, 72.8746320228), (22.1196924068, 72.9188535828), (21.9743467808, 72.9627856072))
            ThreePointArc((21.9743467808, 72.9627856072), (14.8658825376, 74.7358383667), (7.62, 75.8180427075))
            ThreePointArc((7.62, 75.8180427075), (7.4689060931, 75.8330761724), (7.3177825298, 75.8478085303))
            ThreePointArc((7.3177825298, 75.8478085303), (3.6631263964, 76.1119012048), (0, 76.2))
            ThreePointArc((0, 76.2), (-3.6631263964, 76.1119012048), (-7.3177825298, 75.8478085303))
            ThreePointArc((-7.3177825298, 75.8478085303), (-7.4689060931, 75.8330761724), (-7.62, 75.8180427075))
            ThreePointArc((-7.62, 75.8180427075), (-14.8658825376, 74.7358383667), (-21.9743467808, 72.9627856072))
            ThreePointArc((-21.9743467808, 72.9627856072), (-22.1196924068, 72.9188535828), (-22.2649502031, 72.8746320228))
            ThreePointArc((-22.2649502031, 72.8746320228), (-29.1604775462, 70.3996203774), (-35.7864492084, 67.2738437512))
            ThreePointArc((-35.7864492084, 67.2738437512), (-35.9204313461, 67.2024003433), (-36.0542708563, 67.1306900979))
            ThreePointArc((-36.0542708563, 67.1306900979), (-42.3344517561, 63.3579844575), (-48.2232984621, 58.9996058074))
            ThreePointArc((-48.2232984621, 58.9996058074), (-48.3407682533, 58.9033965462), (-48.4580460999, 58.8069534))
            ThreePointArc((-48.4580460999, 58.8069534), (-53.8815367264, 53.8815367264), (-58.8069534, 48.4580460999))
            ThreePointArc((-58.8069534, 48.4580460999), (-58.9033965462, 48.3407682533), (-58.9996058074, 48.2232984621))
            ThreePointArc((-58.9996058074, 48.2232984621), (-63.3579844575, 42.3344517561), (-67.1306900979, 36.0542708563))
            ThreePointArc((-67.1306900979, 36.0542708563), (-67.2024003433, 35.9204313461), (-67.2738437512, 35.7864492084))
            ThreePointArc((-67.2738437512, 35.7864492084), (-70.3996203774, 29.1604775462), (-72.8746320228, 22.2649502031))
            ThreePointArc((-72.8746320228, 22.2649502031), (-72.9188535828, 22.1196924068), (-72.9627856072, 21.9743467808))
            ThreePointArc((-72.9627856072, 21.9743467808), (-74.7358383667, 14.8658825376), (-75.8180427075, 7.62))
            ThreePointArc((-75.8180427075, 7.62), (-75.8330761724, 7.4689060931), (-75.8478085303, 7.3177825298))
            ThreePointArc((-75.8478085303, 7.3177825298), (-76.2, 0), (-75.8478085303, -7.3177825298))
            ThreePointArc((-75.8478085303, -7.3177825298), (-75.8330761724, -7.4689060931), (-75.8180427075, -7.62))
            ThreePointArc((-75.8180427075, -7.62), (-74.7358383667, -14.8658825376), (-72.9627856072, -21.9743467808))
            ThreePointArc((-72.9627856072, -21.9743467808), (-72.9188535828, -22.1196924068), (-72.8746320228, -22.2649502031))
            ThreePointArc((-72.8746320228, -22.2649502031), (-70.3996203774, -29.1604775462), (-67.2738437512, -35.7864492084))
            ThreePointArc((-67.2738437512, -35.7864492084), (-67.2024003433, -35.9204313461), (-67.1306900979, -36.0542708563))
            ThreePointArc((-67.1306900979, -36.0542708563), (-63.3579844575, -42.3344517561), (-58.9996058074, -48.2232984621))
            ThreePointArc((-58.9996058074, -48.2232984621), (-58.9033965462, -48.3407682533), (-58.8069534, -48.4580460999))
            ThreePointArc((-58.8069534, -48.4580460999), (-53.8815367264, -53.8815367264), (-48.4580460999, -58.8069534))
            ThreePointArc((-48.4580460999, -58.8069534), (-48.3407682533, -58.9033965462), (-48.2232984621, -58.9996058074))
            ThreePointArc((-48.2232984621, -58.9996058074), (-42.3344517561, -63.3579844575), (-36.0542708563, -67.1306900979))
            ThreePointArc((-36.0542708563, -67.1306900979), (-35.9204313461, -67.2024003433), (-35.7864492084, -67.2738437512))
            ThreePointArc((-35.7864492084, -67.2738437512), (-29.1604775462, -70.3996203774), (-22.2649502031, -72.8746320228))
            ThreePointArc((-22.2649502031, -72.8746320228), (-22.1196924068, -72.9188535828), (-21.9743467808, -72.9627856072))
            ThreePointArc((-21.9743467808, -72.9627856072), (-14.8658825376, -74.7358383667), (-7.62, -75.8180427075))
            ThreePointArc((-7.62, -75.8180427075), (-7.4689060931, -75.8330761724), (-7.3177825298, -75.8478085303))
            ThreePointArc((-7.3177825298, -75.8478085303), (0, -76.2), (7.3177825298, -75.8478085303))
            ThreePointArc((7.3177825298, -75.8478085303), (7.4689060931, -75.8330761724), (7.62, -75.8180427075))
            ThreePointArc((7.62, -75.8180427075), (14.8658825376, -74.7358383667), (21.9743467808, -72.9627856072))
            ThreePointArc((21.9743467808, -72.9627856072), (22.1196924068, -72.9188535828), (22.2649502031, -72.8746320228))
            ThreePointArc((22.2649502031, -72.8746320228), (29.1604775462, -70.3996203774), (35.7864492084, -67.2738437512))
            ThreePointArc((35.7864492084, -67.2738437512), (35.9204313461, -67.2024003433), (36.0542708563, -67.1306900979))
            ThreePointArc((36.0542708563, -67.1306900979), (42.3344517561, -63.3579844575), (48.2232984621, -58.9996058074))
            ThreePointArc((48.2232984621, -58.9996058074), (48.3407682533, -58.9033965462), (48.4580460999, -58.8069534))
            ThreePointArc((48.4580460999, -58.8069534), (53.8815367264, -53.8815367264), (58.8069534, -48.4580460999))
            ThreePointArc((58.8069534, -48.4580460999), (58.9033965462, -48.3407682533), (58.9996058074, -48.2232984621))
            ThreePointArc((58.9996058074, -48.2232984621), (63.3579844575, -42.3344517561), (67.1306900979, -36.0542708563))
            ThreePointArc((67.1306900979, -36.0542708563), (67.2024003433, -35.9204313461), (67.2738437512, -35.7864492084))
            ThreePointArc((67.2738437512, -35.7864492084), (70.3996203774, -29.1604775462), (72.8746320228, -22.2649502031))
            ThreePointArc((72.8746320228, -22.2649502031), (72.9188535828, -22.1196924068), (72.9627856072, -21.9743467808))
            ThreePointArc((72.9627856072, -21.9743467808), (74.7358383667, -14.8658825376), (75.8180427075, -7.62))
            ThreePointArc((75.8180427075, -7.62), (75.8330761724, -7.4689060931), (75.8478085303, -7.3177825298))
        make_face()
        with BuildLine():
            ThreePointArc((25.4, 0), (-17.9605122421, -17.9605122421), (0, 25.4))
            ThreePointArc((0, 25.4), (17.9605122421, 17.9605122421), (25.4, 0))
        make_face(mode=Mode.SUBTRACT)
    extrude(amount=F3_DEPTH, both=True)


solid = f1.part
